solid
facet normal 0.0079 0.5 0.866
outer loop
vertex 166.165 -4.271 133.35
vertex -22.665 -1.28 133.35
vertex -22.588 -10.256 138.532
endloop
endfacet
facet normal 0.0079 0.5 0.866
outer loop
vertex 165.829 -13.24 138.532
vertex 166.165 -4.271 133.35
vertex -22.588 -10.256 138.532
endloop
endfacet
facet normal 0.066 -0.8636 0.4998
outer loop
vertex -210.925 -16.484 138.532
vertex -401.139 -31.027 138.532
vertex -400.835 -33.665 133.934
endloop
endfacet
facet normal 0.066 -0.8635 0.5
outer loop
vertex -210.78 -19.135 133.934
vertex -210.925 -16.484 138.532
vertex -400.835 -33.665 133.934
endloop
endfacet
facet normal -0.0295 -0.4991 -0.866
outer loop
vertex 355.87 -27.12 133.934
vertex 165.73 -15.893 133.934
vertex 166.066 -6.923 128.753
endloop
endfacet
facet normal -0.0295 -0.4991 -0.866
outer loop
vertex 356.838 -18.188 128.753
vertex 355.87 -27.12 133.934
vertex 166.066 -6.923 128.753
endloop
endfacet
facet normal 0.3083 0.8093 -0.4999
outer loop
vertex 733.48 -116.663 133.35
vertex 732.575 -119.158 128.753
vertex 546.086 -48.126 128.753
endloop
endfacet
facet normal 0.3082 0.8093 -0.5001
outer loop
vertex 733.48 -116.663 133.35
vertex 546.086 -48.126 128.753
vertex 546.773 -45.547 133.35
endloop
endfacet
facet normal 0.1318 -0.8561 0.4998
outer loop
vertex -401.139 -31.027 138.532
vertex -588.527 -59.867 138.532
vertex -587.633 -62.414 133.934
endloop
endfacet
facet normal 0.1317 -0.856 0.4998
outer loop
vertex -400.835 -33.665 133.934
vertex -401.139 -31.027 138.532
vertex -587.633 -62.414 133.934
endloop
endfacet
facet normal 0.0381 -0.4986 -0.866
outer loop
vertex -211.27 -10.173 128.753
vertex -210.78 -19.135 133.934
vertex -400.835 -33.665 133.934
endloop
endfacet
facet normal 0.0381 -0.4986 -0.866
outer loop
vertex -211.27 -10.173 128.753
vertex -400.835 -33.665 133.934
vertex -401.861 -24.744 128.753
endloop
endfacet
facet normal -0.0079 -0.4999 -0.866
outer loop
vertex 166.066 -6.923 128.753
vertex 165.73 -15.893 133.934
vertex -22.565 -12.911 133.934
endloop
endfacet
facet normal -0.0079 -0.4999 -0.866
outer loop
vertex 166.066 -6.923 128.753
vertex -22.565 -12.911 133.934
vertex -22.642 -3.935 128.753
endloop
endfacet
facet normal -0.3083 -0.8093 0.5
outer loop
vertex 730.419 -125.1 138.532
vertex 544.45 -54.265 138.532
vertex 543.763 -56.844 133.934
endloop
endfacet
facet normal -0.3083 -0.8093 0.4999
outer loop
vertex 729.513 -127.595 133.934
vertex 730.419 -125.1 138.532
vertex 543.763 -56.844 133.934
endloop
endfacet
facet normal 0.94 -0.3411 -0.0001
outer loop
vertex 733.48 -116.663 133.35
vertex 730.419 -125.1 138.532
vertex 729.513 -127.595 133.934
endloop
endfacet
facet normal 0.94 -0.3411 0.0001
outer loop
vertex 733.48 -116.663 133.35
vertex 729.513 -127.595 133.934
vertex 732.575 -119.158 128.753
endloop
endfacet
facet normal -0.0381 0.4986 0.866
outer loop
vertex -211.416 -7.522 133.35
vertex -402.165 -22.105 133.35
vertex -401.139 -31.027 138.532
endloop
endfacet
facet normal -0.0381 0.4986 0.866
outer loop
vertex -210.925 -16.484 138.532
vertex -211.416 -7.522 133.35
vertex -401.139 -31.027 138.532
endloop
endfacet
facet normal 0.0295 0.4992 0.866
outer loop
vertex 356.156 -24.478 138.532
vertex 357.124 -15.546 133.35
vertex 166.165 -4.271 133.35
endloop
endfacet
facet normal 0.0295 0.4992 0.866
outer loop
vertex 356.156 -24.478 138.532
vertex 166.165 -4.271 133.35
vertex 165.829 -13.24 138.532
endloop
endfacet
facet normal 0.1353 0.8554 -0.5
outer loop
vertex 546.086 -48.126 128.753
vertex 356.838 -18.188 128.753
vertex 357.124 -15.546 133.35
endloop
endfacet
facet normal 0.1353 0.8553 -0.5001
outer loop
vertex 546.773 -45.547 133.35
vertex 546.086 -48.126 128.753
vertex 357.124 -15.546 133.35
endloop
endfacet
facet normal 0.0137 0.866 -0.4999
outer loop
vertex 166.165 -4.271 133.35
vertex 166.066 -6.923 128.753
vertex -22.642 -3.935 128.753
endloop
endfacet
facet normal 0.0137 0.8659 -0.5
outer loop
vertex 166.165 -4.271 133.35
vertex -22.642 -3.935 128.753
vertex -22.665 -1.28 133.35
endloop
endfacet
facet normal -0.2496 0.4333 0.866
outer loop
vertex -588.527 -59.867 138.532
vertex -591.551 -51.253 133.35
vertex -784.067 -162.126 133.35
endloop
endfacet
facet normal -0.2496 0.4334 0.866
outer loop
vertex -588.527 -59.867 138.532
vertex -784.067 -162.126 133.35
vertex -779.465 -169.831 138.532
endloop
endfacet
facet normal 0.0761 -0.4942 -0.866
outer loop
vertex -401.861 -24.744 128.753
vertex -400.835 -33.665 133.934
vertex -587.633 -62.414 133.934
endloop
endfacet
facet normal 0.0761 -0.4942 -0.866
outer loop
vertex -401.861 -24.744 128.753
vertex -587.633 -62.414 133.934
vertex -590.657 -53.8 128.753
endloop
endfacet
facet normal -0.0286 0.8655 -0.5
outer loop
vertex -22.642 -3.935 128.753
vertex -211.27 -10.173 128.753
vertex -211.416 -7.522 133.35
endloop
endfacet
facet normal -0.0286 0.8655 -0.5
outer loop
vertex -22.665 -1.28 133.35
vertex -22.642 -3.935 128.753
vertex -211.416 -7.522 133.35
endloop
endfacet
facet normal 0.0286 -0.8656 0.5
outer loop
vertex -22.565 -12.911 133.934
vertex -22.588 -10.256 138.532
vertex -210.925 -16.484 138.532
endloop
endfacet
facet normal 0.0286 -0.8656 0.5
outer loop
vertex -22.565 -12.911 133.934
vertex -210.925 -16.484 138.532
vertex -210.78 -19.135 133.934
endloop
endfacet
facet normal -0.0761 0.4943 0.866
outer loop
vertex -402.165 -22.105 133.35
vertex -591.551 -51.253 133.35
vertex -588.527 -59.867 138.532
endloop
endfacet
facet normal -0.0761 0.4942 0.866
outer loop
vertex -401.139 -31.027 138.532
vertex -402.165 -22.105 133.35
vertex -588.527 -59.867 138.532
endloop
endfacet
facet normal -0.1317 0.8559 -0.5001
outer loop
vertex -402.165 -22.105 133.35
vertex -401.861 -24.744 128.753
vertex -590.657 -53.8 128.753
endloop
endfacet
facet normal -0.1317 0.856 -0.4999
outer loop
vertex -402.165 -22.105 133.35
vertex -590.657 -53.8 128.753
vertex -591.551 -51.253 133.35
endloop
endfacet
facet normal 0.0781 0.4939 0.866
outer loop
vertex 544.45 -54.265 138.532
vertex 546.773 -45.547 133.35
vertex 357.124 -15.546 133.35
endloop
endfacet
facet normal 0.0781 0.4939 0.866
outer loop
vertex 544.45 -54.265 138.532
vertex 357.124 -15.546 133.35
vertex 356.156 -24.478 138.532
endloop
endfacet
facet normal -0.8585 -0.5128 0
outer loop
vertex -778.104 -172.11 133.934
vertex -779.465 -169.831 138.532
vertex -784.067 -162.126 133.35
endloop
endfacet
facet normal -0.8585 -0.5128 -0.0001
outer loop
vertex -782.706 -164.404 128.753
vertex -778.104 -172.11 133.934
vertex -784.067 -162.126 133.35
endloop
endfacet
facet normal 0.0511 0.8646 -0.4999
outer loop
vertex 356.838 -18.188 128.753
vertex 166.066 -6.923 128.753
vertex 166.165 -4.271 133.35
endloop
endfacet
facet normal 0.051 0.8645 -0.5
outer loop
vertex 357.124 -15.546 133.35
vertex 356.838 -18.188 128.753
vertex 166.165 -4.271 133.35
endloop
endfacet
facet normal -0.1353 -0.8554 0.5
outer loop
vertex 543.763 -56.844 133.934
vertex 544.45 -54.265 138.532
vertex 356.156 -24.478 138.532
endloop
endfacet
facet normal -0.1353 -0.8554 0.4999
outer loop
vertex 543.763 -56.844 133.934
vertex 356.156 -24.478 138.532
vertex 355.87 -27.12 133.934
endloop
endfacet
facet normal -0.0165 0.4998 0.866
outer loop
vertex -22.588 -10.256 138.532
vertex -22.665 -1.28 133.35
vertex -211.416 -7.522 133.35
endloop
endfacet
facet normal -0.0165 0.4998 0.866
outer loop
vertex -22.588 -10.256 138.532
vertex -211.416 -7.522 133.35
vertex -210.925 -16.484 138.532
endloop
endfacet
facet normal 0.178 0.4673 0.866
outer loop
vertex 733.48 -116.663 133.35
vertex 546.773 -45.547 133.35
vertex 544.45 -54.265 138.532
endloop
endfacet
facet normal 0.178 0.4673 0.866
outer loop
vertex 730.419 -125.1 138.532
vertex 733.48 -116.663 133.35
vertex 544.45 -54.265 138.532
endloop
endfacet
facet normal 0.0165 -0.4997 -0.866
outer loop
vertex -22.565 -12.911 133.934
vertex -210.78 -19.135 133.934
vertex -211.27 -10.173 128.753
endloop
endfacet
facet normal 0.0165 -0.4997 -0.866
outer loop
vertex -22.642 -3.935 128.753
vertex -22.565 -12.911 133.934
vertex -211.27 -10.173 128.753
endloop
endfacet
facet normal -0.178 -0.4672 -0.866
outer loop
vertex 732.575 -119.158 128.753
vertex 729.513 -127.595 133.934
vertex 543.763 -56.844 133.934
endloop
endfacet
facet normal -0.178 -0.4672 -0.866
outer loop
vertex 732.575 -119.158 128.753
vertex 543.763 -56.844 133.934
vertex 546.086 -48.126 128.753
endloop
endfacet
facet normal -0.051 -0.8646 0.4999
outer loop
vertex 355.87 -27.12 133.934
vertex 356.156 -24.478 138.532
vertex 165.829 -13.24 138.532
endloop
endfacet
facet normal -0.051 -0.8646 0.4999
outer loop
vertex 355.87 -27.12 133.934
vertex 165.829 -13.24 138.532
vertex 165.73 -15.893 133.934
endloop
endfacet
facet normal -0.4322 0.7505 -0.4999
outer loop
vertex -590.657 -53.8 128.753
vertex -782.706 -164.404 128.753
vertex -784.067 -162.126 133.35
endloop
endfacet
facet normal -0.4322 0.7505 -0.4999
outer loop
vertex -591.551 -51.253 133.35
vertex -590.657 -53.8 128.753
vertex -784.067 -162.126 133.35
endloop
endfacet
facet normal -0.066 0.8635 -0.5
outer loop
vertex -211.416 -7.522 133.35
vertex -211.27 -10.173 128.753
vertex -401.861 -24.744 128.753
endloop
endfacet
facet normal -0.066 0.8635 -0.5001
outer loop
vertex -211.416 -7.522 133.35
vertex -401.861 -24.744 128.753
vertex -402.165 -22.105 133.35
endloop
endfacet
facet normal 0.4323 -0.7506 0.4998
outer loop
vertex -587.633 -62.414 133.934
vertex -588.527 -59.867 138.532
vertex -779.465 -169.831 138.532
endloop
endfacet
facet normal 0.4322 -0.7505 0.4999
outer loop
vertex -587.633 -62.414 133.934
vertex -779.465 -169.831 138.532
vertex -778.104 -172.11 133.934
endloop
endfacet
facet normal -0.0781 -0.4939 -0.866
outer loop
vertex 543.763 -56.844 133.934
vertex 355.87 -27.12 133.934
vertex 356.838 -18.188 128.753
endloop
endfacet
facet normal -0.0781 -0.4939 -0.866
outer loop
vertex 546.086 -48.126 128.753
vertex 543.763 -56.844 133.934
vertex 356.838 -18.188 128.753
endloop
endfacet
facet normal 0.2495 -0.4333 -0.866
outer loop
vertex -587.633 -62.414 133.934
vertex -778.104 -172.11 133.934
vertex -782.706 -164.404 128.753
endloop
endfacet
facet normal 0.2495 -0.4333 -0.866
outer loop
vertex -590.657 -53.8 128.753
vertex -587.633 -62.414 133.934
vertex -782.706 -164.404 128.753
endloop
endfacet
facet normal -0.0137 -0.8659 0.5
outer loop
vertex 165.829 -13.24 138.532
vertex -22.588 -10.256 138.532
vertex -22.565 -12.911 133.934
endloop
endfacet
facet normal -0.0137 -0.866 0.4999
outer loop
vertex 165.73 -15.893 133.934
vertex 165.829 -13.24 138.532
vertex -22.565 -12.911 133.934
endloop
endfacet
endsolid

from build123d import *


with BuildPart() as part:
    # Sweep1: sweep along a path in Sketch1
    with BuildLine(Plane.XY.offset(133.35)) as sweep1_path:
        Line((-784.071645386, -162.117385896), (-591.554631016, -51.243460213))
        Line((-591.554631016, -51.243460213), (-402.166018744, -22.095582214))
        Line((-402.166018744, -22.095582214), (-211.416027506, -7.512293336))
        Line((-211.416027506, -7.512293336), (-22.665229034, -1.270332507))
        Line((-22.665229034, -1.270332507), (166.165138103, -4.260913688))
        Line((166.165138103, -4.260913688), (357.125134769, -15.536328702))
        Line((357.125134769, -15.536328702), (546.775185731, -45.538131397))
        Line((546.775185731, -45.538131397), (733.483443068, -116.654162228))
    # Sketch2 → Sweep1 (sweep)
    with BuildSketch(Plane(origin=(0, 0, 0), x_dir=(0, 0, -1), z_dir=(1, 0, 0))):
        Polygon((-133.35, -1.638900587), (-128.752617541, -4.293200587), (-133.934217541, -13.267995051), (-138.5316, -10.613695051), align=None)
    sweep(path=sweep1_path.line, transition=Transition.RIGHT)


solid = part.part
